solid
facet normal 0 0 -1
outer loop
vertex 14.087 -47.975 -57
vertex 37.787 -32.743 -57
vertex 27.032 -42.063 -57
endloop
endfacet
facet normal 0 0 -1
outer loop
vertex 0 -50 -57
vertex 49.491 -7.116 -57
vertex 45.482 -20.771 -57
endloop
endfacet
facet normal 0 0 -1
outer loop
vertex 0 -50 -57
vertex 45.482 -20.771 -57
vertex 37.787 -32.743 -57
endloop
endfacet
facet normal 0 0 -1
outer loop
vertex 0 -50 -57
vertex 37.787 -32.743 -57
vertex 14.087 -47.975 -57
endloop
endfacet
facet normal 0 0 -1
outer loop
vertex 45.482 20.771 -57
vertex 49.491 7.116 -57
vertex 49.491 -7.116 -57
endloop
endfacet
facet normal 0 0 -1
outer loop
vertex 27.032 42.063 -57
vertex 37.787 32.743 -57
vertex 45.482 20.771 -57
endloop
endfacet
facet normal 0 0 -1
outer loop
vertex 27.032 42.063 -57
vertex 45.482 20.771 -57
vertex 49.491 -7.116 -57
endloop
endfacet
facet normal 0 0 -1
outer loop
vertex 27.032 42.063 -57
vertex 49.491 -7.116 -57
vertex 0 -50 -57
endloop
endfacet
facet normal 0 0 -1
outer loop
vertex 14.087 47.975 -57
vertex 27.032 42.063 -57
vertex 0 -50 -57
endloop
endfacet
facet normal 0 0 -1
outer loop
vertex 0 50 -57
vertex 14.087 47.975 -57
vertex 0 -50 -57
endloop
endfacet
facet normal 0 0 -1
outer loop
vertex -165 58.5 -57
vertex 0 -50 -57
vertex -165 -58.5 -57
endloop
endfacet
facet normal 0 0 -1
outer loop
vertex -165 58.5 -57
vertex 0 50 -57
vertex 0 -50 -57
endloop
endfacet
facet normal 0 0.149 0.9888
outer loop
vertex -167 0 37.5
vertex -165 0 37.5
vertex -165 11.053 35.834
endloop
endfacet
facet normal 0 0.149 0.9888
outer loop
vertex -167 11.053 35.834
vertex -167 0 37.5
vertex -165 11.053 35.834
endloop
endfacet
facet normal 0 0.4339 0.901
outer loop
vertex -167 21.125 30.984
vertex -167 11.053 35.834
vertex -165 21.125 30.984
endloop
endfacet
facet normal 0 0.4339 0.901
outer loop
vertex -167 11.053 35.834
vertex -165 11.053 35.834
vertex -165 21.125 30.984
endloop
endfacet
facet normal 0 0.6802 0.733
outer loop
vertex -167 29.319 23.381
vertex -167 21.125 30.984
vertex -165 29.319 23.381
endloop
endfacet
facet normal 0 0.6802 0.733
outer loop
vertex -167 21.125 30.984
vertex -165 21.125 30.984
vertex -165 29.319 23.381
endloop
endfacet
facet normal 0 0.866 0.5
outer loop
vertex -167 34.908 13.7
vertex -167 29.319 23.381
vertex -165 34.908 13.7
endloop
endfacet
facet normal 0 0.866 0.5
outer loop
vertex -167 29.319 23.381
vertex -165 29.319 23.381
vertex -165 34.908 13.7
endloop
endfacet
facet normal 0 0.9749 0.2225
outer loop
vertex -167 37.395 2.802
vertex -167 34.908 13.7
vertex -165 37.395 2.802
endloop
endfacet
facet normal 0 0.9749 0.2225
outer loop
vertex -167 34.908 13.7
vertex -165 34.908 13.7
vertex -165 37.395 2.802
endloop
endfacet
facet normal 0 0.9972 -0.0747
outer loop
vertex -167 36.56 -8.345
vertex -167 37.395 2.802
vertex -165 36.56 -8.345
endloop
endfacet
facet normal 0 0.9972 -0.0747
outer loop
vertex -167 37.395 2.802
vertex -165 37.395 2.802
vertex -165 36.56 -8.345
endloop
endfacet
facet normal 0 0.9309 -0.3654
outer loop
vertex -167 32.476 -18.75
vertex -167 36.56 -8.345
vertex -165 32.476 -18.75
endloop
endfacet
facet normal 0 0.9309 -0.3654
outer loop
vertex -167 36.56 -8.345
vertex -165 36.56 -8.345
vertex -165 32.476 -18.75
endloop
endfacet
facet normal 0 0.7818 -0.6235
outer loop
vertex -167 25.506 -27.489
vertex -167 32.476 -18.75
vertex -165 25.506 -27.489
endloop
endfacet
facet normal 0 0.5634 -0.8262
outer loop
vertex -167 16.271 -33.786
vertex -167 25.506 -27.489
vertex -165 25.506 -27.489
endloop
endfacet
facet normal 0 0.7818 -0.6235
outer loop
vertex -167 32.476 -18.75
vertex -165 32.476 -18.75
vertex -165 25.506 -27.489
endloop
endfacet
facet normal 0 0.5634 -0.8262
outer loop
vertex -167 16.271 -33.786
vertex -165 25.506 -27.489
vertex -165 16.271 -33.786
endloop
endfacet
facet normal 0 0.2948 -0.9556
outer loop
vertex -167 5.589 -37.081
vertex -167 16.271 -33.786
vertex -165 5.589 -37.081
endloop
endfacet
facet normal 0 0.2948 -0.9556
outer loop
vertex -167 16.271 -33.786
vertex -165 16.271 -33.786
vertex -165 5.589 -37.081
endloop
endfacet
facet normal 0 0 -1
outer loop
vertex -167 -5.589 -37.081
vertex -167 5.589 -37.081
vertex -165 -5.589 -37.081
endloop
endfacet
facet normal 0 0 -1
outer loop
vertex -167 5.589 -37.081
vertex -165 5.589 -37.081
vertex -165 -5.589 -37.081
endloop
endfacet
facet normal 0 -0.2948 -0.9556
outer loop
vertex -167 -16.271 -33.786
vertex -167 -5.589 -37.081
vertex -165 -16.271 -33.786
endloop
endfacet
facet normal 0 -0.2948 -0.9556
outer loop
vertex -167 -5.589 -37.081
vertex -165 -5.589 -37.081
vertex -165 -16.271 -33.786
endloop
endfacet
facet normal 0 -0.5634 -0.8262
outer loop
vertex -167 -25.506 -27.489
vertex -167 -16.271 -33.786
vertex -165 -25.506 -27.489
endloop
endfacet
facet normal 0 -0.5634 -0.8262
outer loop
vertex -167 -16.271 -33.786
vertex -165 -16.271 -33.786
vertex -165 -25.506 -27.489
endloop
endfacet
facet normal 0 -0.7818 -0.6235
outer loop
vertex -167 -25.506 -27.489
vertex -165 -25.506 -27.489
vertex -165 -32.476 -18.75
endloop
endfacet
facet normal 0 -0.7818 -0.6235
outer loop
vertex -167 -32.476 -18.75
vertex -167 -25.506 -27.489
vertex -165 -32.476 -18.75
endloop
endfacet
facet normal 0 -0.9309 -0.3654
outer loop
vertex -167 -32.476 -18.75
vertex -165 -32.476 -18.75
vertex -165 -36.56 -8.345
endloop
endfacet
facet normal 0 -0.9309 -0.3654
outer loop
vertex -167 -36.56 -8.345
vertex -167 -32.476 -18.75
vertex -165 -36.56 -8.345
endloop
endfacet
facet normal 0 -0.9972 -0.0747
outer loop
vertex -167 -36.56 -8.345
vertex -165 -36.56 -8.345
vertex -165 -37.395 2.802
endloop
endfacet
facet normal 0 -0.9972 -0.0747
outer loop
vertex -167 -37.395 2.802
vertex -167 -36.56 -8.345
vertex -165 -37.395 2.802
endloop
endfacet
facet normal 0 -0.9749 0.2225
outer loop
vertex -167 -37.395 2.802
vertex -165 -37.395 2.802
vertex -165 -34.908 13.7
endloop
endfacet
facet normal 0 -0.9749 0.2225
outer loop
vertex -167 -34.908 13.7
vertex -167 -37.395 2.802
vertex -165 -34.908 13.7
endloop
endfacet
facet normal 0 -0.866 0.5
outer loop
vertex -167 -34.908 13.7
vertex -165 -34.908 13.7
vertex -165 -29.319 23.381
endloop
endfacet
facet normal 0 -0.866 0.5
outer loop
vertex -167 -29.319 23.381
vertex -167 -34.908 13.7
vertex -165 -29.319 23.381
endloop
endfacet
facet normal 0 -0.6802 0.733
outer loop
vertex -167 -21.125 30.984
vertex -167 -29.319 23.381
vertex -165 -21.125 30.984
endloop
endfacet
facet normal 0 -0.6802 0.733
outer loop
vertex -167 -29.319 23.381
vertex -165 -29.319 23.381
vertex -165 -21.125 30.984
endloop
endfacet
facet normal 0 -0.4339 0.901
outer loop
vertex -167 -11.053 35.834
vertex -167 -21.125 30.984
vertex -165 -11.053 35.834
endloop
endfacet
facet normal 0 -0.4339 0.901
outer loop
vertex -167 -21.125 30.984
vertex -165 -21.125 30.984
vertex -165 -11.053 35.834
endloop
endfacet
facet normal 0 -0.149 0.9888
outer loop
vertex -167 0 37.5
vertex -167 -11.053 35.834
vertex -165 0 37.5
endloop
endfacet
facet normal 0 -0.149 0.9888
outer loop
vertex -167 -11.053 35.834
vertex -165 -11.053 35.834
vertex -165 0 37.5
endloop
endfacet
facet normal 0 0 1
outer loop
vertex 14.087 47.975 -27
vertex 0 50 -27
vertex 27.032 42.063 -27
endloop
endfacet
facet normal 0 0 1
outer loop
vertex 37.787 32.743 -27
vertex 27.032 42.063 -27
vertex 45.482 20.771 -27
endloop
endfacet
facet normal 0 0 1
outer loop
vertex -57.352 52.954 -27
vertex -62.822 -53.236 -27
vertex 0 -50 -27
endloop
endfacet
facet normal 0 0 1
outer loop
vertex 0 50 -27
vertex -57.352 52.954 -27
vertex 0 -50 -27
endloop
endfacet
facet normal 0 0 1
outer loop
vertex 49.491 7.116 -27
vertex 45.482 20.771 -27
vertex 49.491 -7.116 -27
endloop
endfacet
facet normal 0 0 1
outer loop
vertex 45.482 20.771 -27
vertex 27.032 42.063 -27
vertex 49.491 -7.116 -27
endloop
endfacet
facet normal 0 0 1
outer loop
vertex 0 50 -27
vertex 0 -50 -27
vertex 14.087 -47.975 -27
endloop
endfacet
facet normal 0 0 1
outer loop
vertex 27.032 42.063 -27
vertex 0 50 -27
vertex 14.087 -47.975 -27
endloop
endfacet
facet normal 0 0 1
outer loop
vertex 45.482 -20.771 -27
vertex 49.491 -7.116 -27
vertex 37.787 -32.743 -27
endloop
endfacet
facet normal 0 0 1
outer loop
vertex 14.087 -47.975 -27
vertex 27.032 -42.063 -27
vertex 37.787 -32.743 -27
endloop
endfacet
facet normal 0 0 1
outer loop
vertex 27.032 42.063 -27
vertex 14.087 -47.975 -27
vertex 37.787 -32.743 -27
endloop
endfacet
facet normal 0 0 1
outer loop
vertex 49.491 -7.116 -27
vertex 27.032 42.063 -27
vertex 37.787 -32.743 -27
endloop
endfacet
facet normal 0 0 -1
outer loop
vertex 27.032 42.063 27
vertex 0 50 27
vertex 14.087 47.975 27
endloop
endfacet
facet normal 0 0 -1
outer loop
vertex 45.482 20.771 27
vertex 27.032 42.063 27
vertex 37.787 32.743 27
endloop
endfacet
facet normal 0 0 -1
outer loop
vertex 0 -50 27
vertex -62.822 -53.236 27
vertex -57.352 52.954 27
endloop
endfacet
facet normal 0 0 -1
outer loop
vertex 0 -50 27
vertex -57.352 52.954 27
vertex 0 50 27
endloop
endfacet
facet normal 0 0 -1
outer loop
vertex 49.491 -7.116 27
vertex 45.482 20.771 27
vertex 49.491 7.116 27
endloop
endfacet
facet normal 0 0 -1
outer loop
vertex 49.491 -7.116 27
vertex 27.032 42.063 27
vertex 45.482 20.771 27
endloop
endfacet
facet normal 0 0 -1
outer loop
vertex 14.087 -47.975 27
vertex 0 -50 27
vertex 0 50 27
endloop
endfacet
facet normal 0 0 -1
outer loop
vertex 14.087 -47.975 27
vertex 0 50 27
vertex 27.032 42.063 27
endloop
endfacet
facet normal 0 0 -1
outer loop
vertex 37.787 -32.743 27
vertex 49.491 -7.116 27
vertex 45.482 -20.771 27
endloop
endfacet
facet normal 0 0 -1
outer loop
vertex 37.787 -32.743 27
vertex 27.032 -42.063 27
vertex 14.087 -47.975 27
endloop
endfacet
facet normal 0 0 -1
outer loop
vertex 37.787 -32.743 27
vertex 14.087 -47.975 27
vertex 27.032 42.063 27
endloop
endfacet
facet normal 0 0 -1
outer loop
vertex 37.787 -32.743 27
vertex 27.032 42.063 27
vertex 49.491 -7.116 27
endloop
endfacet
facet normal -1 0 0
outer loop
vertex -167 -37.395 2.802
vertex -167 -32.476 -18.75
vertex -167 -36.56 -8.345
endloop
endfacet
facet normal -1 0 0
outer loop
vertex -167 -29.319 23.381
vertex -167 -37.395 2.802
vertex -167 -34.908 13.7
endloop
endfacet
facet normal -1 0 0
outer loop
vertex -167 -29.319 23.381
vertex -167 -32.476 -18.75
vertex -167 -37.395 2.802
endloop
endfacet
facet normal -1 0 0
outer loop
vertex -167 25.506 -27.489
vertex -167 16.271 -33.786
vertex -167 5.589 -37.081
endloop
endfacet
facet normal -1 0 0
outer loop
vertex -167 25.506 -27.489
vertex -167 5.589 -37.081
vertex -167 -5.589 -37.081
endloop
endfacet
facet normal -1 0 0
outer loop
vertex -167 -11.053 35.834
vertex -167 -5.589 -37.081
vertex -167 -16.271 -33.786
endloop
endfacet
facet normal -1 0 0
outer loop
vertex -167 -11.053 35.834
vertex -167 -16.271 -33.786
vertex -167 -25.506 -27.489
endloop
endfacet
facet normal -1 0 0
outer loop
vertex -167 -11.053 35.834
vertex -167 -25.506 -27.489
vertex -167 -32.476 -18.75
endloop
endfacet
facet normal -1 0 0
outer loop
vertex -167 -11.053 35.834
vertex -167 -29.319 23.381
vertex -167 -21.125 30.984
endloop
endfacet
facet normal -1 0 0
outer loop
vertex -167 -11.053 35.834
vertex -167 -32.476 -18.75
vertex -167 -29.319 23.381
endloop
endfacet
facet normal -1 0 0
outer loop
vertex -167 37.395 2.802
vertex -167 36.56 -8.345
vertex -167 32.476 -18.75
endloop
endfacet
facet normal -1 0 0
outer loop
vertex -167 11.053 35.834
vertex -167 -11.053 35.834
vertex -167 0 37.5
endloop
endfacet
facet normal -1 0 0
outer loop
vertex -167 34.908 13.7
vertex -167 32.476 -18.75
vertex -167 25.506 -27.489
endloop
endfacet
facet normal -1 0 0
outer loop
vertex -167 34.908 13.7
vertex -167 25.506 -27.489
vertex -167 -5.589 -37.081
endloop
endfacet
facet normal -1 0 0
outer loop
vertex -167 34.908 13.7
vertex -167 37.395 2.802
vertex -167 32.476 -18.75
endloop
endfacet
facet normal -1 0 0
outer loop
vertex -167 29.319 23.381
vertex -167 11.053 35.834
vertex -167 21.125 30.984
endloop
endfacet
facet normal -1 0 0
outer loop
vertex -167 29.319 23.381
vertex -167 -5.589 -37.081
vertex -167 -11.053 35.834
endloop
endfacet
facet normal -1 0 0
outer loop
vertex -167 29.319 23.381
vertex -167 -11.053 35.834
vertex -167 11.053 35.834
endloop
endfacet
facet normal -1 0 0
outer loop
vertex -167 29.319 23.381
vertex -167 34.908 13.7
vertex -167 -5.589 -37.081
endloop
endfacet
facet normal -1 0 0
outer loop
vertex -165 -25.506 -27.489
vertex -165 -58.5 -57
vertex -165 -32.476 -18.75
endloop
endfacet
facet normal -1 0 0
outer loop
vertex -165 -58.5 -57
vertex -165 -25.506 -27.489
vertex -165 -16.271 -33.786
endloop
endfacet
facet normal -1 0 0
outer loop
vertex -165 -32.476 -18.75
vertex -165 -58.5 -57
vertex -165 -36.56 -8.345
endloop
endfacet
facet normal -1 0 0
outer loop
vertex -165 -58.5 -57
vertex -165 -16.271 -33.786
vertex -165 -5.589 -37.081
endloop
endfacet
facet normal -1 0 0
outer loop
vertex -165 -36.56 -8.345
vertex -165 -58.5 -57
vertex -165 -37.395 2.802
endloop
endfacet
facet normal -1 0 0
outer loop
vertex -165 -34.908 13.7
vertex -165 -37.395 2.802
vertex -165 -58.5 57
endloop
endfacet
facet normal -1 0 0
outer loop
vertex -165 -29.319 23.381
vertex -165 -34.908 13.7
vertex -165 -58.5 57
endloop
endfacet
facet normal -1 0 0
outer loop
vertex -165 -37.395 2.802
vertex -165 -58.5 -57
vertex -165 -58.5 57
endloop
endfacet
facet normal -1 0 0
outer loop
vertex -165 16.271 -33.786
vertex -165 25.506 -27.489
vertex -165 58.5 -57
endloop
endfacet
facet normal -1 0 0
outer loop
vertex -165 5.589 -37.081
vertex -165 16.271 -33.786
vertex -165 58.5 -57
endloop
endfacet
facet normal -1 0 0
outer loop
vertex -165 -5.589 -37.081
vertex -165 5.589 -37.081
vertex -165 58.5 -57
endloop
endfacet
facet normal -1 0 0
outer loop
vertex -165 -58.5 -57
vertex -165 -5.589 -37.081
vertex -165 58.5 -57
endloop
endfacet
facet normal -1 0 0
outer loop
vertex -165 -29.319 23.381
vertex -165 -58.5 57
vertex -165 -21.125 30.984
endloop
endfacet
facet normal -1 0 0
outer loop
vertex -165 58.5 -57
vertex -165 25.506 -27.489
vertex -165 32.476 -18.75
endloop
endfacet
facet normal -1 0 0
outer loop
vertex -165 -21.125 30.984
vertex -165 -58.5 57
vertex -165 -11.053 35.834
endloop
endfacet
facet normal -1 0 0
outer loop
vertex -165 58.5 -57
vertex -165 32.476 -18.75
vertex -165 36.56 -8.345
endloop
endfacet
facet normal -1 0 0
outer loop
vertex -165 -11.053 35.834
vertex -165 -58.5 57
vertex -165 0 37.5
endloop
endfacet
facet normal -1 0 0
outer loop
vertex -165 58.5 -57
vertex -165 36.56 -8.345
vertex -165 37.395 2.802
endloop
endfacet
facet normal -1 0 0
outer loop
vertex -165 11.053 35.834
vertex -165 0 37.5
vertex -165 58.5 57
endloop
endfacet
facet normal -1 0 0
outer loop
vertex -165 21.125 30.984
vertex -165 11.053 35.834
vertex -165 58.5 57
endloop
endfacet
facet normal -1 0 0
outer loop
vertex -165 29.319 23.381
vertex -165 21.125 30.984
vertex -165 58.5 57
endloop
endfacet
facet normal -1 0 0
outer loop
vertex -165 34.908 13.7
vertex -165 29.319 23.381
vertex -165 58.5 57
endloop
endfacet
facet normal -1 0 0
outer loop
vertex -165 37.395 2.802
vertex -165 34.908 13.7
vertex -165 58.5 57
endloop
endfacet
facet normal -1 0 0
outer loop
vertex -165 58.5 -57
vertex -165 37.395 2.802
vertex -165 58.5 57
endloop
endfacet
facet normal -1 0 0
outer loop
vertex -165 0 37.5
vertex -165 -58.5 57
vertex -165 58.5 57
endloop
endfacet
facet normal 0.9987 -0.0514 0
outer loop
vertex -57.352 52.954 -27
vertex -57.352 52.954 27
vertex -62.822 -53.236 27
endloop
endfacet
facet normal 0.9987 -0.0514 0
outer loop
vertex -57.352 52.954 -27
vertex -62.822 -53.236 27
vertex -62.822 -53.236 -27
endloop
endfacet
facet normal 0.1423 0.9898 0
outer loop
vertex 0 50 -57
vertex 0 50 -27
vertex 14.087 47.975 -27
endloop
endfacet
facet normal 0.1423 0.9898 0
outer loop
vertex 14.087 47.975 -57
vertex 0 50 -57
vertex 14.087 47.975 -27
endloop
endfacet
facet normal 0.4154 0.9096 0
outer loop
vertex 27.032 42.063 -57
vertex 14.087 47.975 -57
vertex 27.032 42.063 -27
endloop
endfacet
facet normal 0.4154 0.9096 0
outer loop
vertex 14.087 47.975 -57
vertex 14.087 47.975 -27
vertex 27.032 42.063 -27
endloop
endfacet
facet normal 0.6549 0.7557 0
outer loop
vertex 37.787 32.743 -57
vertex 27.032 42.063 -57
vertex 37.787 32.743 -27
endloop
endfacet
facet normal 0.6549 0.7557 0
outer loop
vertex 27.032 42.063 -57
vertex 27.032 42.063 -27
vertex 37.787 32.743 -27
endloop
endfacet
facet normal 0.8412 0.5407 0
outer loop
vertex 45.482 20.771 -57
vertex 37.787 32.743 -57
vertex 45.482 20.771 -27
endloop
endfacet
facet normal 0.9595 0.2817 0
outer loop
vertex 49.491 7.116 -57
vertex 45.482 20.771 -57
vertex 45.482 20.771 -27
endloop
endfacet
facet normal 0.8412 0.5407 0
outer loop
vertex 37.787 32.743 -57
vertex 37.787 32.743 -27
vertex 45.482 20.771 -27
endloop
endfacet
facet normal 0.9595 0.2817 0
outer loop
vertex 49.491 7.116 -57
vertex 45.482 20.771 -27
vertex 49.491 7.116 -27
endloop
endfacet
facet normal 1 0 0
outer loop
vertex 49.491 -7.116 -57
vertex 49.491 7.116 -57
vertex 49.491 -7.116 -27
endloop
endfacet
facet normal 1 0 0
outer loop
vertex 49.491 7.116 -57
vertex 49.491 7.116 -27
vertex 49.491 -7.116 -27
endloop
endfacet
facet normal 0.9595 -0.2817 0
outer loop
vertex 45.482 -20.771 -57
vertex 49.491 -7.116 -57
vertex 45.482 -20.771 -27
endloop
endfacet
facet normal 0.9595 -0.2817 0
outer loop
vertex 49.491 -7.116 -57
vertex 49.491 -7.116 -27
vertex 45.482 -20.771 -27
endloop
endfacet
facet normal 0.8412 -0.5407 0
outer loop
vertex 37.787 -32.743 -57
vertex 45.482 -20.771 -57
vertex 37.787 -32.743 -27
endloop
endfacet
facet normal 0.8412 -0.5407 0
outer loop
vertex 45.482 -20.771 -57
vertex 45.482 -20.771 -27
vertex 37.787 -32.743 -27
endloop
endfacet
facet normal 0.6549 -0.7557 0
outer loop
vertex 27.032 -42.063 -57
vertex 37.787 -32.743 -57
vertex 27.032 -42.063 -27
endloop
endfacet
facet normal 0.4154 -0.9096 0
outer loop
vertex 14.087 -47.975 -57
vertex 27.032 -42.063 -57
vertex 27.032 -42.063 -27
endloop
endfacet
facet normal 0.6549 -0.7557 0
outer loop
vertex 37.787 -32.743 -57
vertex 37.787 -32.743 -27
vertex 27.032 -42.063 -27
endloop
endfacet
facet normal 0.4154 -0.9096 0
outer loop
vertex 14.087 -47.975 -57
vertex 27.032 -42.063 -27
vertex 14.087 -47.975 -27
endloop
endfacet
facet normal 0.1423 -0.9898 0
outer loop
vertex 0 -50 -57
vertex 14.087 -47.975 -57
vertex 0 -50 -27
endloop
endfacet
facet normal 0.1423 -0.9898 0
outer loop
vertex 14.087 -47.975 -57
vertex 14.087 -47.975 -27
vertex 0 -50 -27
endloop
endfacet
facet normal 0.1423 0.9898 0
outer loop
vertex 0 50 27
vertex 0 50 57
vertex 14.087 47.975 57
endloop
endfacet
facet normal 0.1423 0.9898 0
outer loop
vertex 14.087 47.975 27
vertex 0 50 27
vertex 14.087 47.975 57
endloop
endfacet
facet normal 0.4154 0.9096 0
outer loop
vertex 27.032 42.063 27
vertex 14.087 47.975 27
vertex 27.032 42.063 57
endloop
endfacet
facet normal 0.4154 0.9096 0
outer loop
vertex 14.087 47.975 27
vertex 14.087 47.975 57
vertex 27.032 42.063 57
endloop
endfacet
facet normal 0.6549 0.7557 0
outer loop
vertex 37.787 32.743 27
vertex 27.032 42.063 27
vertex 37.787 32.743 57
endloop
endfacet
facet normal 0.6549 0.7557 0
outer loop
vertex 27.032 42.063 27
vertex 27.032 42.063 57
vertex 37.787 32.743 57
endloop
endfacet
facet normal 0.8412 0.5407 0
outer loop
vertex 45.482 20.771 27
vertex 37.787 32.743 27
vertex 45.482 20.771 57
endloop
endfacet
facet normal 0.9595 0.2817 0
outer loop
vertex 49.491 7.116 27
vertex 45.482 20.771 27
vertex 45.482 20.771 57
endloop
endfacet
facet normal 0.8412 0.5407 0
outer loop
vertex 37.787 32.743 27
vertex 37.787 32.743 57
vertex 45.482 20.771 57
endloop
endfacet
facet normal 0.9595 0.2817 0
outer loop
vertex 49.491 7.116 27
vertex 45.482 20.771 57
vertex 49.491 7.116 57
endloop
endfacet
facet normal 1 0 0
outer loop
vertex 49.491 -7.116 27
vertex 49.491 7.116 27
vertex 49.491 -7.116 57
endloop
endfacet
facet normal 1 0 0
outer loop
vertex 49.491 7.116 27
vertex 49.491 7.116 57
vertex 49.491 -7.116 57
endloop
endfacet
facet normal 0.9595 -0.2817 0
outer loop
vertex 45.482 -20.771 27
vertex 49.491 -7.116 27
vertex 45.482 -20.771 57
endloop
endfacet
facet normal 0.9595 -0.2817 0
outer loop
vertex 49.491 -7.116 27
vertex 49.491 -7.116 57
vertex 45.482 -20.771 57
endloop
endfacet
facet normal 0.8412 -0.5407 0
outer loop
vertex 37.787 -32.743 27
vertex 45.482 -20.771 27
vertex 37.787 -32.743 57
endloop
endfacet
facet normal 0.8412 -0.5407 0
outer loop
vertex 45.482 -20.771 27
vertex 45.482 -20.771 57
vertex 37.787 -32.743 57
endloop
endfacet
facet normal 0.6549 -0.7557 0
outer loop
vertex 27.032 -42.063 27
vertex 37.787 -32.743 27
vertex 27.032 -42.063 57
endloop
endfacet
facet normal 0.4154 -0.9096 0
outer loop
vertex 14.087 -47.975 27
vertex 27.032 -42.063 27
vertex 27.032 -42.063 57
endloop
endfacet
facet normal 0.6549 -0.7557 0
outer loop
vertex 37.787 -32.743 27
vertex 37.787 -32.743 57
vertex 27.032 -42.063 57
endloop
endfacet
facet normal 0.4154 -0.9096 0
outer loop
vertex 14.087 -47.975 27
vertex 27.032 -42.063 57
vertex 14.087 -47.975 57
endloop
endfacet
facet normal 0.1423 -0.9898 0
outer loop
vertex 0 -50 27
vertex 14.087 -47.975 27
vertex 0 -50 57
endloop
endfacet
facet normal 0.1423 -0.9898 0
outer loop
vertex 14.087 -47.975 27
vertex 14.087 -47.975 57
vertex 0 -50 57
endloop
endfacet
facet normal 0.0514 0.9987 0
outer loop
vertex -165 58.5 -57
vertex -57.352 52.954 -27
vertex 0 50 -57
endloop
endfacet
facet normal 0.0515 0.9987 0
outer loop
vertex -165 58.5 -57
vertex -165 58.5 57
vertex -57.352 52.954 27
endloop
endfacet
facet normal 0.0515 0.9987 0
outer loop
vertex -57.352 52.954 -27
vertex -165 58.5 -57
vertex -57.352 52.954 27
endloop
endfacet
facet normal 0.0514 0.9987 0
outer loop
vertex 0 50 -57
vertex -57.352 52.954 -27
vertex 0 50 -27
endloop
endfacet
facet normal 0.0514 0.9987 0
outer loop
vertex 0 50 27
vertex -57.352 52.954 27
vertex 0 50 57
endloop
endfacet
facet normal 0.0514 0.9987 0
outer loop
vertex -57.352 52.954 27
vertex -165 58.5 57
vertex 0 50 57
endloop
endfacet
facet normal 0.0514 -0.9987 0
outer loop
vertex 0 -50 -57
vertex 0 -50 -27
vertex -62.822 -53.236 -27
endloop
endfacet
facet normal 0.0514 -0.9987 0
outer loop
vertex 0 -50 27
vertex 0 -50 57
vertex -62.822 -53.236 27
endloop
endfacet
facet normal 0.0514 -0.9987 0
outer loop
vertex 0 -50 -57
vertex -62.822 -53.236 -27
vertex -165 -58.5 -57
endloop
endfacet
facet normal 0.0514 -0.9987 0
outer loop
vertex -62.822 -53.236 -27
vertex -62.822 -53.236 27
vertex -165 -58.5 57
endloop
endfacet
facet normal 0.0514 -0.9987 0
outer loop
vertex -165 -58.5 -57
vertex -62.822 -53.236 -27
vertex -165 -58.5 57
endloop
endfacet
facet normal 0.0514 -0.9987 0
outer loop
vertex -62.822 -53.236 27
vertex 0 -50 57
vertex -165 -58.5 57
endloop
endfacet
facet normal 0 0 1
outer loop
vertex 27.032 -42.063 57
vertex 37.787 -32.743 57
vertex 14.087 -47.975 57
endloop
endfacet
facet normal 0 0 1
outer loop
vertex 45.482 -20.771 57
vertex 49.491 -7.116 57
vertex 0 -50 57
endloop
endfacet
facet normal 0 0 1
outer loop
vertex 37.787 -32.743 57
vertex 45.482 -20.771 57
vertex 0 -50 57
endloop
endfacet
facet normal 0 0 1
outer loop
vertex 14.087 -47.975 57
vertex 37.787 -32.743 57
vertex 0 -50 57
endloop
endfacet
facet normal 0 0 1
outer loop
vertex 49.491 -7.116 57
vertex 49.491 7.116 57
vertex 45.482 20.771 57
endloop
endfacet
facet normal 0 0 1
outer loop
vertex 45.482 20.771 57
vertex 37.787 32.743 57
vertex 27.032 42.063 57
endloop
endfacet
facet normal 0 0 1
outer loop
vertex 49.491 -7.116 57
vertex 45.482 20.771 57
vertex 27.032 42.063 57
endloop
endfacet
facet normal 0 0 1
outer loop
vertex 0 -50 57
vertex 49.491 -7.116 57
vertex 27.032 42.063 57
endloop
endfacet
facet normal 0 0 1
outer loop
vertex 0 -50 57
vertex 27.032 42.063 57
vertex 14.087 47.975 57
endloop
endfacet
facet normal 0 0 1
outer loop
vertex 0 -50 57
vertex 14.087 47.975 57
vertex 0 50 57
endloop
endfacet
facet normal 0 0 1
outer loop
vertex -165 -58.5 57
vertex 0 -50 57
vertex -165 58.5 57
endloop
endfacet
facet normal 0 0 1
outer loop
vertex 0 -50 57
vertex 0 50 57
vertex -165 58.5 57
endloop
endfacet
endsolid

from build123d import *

# Parameters (mm, degrees)
BOSS_EXTRUDE1_DEPTH     = 57
SKETCH2_R               = 37.5
BOSS_EXTRUDE2_DEPTH     = 2
CUT_EXTRUDE1_DEPTH      = 210.155863705
CUT_EXTRUDE1_DEPTH_BACK = 210.155863705
SKETCH3_W               = 110
SKETCH3_H               = 54


with BuildPart() as part:
    # Sketch1 → Boss-Extrude1 (new, symmetric)
    with BuildSketch(Plane.XY):
        with BuildLine():
            Line((-165, -58.5), (-165, 58.5))
            Line((-165, 58.5), (0, 50))
            ThreePointArc((0, 50), (50, 0), (0, -50))
            Line((0, -50), (-165, -58.5))
        make_face()
    extrude(amount=BOSS_EXTRUDE1_DEPTH, both=True)

    # Sketch2 → Boss-Extrude2 (add)
    with BuildSketch(Plane.ZY.offset(165)):
        Circle(SKETCH2_R)
    extrude(amount=BOSS_EXTRUDE2_DEPTH)

    # Sketch3 → Cut-Extrude1 (cut, two sides: drawn at the far end of the back side and taken through both)
    with BuildSketch(Plane(origin=(2.568940095, 49.867660662, 0), x_dir=(0.9986757297720645, -0.05144693153371229, 0), z_dir=(0.051446931533712284, 0.9986757297720644, 0)).offset(-CUT_EXTRUDE1_DEPTH_BACK)):
        with Locations((-5, 0)):
            Rectangle(SKETCH3_W, SKETCH3_H)
    extrude(amount=CUT_EXTRUDE1_DEPTH + CUT_EXTRUDE1_DEPTH_BACK, mode=Mode.SUBTRACT)


solid = part.part
